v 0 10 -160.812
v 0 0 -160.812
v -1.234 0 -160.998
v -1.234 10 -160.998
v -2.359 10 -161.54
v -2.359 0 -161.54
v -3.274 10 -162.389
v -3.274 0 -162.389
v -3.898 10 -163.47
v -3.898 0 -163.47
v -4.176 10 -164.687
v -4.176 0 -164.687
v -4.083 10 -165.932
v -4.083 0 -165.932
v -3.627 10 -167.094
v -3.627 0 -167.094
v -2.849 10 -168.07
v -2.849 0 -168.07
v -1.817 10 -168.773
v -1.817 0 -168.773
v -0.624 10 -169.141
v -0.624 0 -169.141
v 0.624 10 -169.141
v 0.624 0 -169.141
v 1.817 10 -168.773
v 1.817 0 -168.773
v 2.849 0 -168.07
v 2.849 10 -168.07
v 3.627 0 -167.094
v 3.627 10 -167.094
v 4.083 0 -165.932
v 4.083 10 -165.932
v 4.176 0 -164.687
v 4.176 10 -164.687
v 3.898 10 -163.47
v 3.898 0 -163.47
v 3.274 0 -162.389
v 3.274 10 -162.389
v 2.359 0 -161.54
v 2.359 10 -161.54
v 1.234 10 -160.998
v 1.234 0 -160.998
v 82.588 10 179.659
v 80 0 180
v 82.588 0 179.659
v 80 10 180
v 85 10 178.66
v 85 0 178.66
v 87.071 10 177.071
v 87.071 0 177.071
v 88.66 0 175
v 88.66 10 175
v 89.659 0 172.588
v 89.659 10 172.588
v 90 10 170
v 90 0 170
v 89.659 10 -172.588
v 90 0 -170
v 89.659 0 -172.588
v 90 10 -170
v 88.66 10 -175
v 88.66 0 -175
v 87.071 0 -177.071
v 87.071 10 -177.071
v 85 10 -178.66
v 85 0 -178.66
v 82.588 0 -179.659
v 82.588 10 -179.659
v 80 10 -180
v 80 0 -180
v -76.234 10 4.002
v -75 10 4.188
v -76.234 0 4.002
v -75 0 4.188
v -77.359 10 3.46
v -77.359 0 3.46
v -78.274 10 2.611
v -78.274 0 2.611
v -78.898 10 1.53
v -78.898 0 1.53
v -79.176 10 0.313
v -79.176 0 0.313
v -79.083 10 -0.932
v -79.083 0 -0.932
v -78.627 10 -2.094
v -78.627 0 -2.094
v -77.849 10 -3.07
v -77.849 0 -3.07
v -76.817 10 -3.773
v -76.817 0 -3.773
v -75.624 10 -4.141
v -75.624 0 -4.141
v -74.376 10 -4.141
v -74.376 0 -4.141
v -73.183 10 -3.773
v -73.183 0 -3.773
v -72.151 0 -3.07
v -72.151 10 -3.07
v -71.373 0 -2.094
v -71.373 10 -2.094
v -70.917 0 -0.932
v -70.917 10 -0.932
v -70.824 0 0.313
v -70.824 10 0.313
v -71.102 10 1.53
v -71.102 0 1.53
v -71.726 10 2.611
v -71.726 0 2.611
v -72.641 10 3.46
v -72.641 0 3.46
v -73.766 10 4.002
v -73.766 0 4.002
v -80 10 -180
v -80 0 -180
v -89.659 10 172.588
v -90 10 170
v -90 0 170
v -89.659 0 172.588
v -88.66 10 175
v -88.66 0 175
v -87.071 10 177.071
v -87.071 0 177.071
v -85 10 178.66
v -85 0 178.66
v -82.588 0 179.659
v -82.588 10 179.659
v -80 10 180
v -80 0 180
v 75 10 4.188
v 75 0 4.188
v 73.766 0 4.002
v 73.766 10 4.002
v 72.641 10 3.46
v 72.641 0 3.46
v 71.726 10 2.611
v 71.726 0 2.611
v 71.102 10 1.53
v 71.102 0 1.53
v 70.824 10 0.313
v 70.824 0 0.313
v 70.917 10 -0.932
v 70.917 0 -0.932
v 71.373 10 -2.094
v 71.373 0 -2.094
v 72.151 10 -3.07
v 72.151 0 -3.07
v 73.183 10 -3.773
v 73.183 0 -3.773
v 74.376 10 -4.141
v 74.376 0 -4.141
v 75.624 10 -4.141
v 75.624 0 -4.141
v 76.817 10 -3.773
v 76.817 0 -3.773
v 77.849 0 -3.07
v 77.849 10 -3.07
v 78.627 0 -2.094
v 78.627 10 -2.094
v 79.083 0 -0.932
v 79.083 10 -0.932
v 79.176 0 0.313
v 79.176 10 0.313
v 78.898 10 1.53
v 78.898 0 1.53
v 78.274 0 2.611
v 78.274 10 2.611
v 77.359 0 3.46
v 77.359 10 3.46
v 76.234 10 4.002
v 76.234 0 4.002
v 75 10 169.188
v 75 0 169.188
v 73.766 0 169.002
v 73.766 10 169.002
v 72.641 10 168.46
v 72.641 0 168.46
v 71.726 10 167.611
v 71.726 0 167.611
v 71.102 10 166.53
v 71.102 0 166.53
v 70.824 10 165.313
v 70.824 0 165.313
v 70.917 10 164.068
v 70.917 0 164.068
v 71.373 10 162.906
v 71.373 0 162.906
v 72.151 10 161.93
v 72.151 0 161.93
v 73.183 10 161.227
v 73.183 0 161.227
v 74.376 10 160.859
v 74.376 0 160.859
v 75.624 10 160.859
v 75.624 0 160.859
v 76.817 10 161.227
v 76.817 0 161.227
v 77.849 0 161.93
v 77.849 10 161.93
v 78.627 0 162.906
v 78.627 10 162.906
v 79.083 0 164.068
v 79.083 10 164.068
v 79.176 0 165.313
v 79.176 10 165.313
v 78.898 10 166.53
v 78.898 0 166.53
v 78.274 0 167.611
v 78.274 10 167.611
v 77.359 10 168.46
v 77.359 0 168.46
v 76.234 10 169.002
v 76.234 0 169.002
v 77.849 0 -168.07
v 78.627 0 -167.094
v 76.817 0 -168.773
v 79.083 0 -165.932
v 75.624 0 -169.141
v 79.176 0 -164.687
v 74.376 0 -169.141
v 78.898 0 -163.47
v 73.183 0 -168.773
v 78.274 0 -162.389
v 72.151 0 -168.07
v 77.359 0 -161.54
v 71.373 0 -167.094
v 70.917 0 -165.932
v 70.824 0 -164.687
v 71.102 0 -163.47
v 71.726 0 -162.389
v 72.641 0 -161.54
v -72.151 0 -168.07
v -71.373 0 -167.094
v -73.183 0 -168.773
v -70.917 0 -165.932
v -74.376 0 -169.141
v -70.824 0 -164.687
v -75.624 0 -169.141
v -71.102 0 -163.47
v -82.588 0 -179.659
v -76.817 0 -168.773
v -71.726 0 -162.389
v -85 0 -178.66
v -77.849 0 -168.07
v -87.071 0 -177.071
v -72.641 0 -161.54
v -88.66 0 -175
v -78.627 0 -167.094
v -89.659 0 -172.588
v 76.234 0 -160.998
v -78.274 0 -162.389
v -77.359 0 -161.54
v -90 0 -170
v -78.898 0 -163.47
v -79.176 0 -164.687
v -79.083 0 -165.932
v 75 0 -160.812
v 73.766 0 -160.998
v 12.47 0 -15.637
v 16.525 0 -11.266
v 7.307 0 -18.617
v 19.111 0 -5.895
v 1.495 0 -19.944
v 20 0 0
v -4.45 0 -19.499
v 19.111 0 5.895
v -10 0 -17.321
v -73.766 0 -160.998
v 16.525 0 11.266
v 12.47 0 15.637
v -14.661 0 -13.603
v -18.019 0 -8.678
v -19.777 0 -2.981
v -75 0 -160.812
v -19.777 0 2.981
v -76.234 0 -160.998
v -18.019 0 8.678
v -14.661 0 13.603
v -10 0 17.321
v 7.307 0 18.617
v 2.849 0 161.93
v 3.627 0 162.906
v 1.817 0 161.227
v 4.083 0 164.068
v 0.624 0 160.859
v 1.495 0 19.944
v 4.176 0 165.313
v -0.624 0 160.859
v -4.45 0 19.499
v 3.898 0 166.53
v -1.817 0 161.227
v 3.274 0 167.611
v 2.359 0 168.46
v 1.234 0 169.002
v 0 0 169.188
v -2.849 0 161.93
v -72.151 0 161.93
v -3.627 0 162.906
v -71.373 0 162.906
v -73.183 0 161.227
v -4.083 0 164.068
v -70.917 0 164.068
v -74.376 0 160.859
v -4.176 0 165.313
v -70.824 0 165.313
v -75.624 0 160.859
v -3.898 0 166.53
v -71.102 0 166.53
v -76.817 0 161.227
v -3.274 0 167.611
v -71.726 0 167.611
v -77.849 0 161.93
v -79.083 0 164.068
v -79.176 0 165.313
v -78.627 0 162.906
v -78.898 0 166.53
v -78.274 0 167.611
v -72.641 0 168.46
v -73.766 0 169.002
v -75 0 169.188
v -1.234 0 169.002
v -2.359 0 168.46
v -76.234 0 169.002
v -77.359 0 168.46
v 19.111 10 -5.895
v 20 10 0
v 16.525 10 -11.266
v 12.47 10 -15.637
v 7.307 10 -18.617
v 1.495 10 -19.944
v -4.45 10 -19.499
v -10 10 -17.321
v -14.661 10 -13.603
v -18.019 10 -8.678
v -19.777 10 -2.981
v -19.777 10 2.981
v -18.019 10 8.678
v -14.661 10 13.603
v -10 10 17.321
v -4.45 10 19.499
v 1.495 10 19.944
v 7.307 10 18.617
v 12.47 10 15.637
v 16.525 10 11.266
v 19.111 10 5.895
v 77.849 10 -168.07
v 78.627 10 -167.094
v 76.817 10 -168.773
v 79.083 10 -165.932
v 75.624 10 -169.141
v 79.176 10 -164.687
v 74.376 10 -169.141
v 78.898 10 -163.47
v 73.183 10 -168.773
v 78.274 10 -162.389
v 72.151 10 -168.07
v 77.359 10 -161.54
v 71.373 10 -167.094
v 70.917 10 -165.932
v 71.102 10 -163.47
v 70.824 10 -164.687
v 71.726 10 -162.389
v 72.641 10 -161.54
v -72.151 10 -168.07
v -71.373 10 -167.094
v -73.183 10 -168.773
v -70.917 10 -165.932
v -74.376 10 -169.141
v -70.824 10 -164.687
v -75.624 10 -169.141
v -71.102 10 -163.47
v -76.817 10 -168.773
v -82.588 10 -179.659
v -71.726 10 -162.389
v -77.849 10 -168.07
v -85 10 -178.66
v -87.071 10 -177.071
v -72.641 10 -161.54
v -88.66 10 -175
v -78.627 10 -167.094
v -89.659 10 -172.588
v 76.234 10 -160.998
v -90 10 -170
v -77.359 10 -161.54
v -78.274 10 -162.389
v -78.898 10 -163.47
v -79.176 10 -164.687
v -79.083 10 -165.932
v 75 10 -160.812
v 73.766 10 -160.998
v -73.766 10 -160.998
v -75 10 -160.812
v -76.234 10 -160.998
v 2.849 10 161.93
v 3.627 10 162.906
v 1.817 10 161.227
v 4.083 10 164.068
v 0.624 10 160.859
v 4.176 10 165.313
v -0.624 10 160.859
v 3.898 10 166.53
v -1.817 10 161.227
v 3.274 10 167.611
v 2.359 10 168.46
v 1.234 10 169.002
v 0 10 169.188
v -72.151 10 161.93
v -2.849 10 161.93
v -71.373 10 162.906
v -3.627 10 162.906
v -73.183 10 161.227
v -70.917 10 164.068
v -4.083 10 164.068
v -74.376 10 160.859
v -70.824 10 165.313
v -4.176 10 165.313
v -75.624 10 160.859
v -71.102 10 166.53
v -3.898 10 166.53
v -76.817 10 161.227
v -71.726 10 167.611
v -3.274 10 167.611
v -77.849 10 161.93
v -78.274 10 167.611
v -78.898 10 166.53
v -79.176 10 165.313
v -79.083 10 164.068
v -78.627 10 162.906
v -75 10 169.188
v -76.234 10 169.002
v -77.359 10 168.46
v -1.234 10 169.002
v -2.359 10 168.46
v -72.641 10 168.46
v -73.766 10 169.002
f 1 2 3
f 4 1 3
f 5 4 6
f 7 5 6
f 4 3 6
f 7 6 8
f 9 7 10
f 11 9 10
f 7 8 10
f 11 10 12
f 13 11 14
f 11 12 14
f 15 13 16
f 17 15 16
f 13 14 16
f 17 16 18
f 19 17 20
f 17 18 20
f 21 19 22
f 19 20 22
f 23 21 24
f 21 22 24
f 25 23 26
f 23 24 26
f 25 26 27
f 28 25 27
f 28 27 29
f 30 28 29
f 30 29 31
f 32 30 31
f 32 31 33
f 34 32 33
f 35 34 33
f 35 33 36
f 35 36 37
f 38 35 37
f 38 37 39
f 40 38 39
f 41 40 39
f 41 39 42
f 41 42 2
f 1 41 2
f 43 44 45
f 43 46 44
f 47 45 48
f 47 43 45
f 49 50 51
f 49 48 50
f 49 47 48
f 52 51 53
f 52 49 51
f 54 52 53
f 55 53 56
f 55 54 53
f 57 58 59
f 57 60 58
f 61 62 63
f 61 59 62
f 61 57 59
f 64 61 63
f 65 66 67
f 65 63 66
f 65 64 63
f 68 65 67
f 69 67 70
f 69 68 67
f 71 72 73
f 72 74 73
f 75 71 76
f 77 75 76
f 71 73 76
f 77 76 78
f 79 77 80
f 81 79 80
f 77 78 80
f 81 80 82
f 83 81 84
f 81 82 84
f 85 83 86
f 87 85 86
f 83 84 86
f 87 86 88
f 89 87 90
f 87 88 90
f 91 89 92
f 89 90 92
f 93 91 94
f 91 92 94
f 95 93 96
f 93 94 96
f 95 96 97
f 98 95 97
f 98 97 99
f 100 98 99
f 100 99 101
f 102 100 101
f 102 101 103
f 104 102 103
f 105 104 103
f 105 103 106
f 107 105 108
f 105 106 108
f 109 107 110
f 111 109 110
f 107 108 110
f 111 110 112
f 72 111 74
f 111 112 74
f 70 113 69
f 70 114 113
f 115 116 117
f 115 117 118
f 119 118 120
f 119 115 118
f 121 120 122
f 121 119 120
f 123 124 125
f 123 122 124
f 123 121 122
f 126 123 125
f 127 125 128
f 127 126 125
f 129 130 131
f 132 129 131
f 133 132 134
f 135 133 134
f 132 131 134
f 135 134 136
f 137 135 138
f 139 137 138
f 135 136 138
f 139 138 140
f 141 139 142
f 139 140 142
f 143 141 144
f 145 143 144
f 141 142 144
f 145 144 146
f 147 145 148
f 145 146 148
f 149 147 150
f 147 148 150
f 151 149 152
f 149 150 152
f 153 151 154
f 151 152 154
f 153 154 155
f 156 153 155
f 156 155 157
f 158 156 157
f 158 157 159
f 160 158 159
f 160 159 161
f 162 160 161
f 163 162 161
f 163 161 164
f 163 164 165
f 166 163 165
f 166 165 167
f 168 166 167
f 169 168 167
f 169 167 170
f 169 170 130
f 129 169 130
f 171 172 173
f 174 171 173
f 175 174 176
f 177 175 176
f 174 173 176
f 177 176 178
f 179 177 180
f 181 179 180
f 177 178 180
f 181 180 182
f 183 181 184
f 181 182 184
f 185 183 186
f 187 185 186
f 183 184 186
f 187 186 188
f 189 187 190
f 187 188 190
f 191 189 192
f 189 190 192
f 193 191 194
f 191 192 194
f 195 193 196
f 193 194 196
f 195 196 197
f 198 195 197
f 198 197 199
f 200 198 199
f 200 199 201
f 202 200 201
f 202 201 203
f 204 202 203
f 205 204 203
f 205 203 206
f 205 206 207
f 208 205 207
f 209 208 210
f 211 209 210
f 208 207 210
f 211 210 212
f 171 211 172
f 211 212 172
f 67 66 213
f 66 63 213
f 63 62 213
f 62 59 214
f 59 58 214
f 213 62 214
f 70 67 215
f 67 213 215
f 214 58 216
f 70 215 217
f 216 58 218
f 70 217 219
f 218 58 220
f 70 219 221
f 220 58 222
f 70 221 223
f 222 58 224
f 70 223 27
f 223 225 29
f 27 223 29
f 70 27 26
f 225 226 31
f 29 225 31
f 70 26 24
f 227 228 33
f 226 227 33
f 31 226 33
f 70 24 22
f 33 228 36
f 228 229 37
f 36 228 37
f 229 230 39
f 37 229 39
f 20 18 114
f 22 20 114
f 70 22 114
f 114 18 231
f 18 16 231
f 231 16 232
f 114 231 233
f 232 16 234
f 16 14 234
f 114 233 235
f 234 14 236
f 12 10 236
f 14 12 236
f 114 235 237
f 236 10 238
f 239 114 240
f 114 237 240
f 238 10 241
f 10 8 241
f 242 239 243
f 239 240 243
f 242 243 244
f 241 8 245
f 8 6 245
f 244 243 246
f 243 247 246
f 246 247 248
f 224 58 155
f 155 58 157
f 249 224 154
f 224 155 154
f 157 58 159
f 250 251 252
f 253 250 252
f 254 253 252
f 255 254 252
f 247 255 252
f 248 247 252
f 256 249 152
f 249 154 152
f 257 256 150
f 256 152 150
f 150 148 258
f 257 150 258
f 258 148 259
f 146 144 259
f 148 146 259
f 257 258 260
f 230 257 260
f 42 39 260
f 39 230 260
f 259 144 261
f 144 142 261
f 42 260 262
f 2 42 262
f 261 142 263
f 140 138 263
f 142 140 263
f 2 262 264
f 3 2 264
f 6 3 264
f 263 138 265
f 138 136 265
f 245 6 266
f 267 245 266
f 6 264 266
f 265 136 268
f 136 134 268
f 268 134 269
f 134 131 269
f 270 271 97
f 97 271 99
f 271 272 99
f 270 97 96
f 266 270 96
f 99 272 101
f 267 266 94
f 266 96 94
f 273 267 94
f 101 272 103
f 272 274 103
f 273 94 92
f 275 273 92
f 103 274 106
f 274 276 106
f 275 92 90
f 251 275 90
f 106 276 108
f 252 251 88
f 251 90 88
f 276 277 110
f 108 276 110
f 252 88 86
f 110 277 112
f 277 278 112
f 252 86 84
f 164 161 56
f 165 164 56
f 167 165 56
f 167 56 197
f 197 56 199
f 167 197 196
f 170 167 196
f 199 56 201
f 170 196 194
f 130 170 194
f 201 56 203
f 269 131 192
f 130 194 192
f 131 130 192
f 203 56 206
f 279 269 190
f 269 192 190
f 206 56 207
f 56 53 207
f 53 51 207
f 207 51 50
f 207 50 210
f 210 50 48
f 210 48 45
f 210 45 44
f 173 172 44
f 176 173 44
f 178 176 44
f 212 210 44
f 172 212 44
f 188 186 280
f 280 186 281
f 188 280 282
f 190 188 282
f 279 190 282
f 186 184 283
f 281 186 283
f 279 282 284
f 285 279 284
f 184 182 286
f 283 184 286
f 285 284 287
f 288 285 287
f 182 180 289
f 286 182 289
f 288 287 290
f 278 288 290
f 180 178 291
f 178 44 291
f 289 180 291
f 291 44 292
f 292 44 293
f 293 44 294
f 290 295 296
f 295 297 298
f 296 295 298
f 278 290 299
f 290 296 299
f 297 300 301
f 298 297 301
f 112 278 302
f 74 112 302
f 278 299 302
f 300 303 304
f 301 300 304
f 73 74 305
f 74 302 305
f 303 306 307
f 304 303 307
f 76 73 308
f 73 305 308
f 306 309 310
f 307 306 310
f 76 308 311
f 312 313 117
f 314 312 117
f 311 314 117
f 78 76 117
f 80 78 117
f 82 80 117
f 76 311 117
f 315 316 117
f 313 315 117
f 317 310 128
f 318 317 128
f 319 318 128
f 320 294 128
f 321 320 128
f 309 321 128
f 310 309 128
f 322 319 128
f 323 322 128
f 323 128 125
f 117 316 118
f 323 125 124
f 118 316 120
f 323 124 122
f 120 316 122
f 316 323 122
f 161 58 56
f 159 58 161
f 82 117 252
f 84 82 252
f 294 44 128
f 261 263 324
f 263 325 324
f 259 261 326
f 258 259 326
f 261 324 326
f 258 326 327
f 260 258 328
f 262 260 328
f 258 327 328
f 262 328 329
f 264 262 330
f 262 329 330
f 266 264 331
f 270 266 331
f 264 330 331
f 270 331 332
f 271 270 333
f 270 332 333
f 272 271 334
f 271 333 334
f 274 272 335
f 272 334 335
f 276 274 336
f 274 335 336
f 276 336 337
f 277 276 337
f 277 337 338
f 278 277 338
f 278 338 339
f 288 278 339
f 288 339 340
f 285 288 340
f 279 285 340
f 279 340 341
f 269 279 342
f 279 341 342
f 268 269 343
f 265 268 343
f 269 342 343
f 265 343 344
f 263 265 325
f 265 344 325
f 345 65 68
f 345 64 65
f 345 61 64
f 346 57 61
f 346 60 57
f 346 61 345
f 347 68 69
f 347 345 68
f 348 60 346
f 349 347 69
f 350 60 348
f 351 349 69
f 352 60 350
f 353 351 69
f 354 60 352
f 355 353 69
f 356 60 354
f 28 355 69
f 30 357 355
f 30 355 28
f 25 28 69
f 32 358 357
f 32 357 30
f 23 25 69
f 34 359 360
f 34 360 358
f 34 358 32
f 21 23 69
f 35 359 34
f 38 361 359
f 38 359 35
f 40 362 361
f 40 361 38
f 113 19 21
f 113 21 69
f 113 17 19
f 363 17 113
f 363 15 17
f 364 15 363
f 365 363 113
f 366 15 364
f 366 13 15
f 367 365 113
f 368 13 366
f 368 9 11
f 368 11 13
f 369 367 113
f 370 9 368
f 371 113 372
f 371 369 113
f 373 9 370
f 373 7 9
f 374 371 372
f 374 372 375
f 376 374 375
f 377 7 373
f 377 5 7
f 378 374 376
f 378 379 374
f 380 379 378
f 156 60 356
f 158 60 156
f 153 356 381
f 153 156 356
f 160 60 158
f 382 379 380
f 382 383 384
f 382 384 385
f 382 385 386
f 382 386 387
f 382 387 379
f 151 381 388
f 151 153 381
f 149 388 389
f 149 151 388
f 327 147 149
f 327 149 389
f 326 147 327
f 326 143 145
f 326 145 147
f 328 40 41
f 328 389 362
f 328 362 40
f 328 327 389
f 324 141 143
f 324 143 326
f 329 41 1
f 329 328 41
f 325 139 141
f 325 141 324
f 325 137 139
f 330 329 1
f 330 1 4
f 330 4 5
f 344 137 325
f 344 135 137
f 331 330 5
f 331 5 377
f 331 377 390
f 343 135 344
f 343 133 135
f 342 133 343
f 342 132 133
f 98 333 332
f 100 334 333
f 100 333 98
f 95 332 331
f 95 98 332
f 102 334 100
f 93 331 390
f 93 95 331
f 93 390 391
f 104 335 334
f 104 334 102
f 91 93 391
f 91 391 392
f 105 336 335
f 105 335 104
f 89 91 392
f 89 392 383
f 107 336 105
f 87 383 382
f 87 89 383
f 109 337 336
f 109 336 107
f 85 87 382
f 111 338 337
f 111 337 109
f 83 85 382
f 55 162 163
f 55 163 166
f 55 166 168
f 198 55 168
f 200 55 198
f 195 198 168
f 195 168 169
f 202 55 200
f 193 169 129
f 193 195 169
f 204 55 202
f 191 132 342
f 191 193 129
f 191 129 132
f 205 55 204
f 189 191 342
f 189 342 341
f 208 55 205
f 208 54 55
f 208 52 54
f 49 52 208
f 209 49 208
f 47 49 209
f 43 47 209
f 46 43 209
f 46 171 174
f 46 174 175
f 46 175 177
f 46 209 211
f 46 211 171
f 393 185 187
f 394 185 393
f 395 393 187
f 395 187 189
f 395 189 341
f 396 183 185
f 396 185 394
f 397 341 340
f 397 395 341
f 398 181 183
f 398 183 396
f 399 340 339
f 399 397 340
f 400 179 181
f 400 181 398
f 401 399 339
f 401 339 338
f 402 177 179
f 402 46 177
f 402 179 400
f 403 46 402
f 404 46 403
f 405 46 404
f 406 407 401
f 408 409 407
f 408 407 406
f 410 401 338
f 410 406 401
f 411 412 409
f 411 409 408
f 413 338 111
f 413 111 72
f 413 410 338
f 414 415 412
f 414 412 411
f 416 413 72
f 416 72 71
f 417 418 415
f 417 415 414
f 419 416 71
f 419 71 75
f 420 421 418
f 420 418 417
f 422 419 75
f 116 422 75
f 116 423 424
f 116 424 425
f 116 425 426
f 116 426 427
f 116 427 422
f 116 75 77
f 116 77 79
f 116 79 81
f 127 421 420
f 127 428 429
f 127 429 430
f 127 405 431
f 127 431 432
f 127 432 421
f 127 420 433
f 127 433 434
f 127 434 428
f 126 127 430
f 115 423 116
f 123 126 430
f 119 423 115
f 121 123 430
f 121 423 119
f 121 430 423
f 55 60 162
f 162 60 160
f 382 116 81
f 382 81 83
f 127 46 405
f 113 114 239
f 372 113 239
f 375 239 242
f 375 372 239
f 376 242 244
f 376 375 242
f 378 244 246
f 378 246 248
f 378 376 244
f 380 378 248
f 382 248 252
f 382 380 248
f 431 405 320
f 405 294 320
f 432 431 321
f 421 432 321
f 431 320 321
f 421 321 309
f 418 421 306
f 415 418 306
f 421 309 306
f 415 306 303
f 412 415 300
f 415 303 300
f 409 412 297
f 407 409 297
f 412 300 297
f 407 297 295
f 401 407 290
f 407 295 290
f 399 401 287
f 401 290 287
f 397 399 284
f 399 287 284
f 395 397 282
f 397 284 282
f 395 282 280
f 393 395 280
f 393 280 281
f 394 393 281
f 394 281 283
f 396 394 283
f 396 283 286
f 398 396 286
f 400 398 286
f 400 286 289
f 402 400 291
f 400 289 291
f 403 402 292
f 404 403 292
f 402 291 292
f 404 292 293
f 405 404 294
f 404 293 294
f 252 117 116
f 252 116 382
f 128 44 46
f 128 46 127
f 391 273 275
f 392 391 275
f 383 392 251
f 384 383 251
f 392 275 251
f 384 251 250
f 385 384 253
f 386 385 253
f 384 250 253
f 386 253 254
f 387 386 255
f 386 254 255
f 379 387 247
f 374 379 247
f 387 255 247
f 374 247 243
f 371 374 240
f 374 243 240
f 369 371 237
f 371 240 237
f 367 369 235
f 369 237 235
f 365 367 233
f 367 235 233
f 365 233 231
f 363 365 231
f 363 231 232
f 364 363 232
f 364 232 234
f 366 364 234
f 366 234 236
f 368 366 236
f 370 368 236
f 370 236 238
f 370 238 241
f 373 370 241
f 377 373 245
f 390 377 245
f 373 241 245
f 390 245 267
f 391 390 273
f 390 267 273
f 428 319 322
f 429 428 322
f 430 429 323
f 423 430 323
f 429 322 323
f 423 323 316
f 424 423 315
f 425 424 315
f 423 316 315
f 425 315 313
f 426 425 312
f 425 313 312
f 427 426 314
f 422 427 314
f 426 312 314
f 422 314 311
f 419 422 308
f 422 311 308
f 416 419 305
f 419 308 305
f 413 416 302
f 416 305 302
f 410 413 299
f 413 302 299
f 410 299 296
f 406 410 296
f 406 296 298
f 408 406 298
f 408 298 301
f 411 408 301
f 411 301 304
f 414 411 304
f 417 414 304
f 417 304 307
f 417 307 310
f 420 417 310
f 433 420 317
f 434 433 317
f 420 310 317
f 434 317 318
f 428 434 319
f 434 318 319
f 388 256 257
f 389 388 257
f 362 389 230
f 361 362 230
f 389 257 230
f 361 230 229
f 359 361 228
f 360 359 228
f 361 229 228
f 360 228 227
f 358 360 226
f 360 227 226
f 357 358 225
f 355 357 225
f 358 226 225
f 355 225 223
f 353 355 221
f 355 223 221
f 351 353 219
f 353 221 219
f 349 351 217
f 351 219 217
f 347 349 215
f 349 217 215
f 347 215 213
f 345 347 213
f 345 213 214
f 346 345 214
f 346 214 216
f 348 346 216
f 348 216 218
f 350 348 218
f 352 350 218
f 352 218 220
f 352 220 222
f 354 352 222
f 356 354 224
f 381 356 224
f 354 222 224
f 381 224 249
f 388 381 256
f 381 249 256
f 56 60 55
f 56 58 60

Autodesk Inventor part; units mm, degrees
ref_plane "YZ Plane" through (0, 0, 0) normal (1, 0, 0) x (0, 1, 0)
ref_plane "XZ Plane" through (0, 0, 0) normal (0, 1, 0) x (-1, 0, 0)
ref_plane "XY Plane" through (0, 0, 0) normal (0, 0, 1) x (1, 0, 0)
sketch "Эскиз1" plane through (0, 0, 0) normal (0, 1, 0) x (-1, 0, 0)
  line L0 (90, -180) -> (-90, -180)
  line L1 (-90, -180) -> (-90, 180)
  line L2 (-90, 180) -> (90, 180)
  line L3 (90, 180) -> (90, -180)
  line L4 (90, -180) -> (-90, 180) construction
  line L5 (-90, -180) -> (90, 180) construction
  point P0 (0, 0)
  dimension "d0" = 180
  dimension "d1" = 360
extrude "Выдавливание1" add sketch "Эскиз1" along normal blind 10
fillet "Сопряжение1" radius 10 4 edges at (-90, 5, -180) (-90, 5, 180) (90, 5, 180) (90, 5, -180)
sketch "Эскиз2" plane through (0, 10, 0) normal (0, 1, 0) x (1, 0, 0)
  line L0 (90, -170) -> (90, 170) projected
  line L1 (-80, -180) -> (80, -180) projected
  line L2 (0, 185.9906) -> (0, -228.4226) construction
  line L3 (-161.892, 0) -> (248.2378, 0) construction
  point P0 (0, 0)
  point P1 (75, -165)
  point P2 (75, 0)
  point P3 (0, -165)
  point P4 (75, 165)
  point P5 (0, 165)
  point P6 (-75, -165)
  point P7 (-75, 0)
  point P8 (-75, 165)
  point P9 (90, 0)
  dimension "d5" = 15
  dimension "d7" = 15
hole "Отверстие1" at (75, 10, 165) at (75, 10, 0) at (0, 10, 165) at (0, 10, -165) at (75, 10, -165) at (-75, 10, -165) at (-75, 10, 0) at (-75, 10, 165) direction (0, -1, 0) diameter 8.376 end through all thread size "M10x1.5" class "6H" standard "ISO Metric profile"
sketch "Эскиз3" plane through (0, 10, 0) normal (0, 1, 0) x (1, 0, 0)
  circle A0 centre (0, 0) radius 20
  dimension "d15" = 40
extrude "Выдавливание2" cut sketch "Эскиз3" against normal through all
properties part number "МПСТ люк" material "Сталь, углеродистая"
